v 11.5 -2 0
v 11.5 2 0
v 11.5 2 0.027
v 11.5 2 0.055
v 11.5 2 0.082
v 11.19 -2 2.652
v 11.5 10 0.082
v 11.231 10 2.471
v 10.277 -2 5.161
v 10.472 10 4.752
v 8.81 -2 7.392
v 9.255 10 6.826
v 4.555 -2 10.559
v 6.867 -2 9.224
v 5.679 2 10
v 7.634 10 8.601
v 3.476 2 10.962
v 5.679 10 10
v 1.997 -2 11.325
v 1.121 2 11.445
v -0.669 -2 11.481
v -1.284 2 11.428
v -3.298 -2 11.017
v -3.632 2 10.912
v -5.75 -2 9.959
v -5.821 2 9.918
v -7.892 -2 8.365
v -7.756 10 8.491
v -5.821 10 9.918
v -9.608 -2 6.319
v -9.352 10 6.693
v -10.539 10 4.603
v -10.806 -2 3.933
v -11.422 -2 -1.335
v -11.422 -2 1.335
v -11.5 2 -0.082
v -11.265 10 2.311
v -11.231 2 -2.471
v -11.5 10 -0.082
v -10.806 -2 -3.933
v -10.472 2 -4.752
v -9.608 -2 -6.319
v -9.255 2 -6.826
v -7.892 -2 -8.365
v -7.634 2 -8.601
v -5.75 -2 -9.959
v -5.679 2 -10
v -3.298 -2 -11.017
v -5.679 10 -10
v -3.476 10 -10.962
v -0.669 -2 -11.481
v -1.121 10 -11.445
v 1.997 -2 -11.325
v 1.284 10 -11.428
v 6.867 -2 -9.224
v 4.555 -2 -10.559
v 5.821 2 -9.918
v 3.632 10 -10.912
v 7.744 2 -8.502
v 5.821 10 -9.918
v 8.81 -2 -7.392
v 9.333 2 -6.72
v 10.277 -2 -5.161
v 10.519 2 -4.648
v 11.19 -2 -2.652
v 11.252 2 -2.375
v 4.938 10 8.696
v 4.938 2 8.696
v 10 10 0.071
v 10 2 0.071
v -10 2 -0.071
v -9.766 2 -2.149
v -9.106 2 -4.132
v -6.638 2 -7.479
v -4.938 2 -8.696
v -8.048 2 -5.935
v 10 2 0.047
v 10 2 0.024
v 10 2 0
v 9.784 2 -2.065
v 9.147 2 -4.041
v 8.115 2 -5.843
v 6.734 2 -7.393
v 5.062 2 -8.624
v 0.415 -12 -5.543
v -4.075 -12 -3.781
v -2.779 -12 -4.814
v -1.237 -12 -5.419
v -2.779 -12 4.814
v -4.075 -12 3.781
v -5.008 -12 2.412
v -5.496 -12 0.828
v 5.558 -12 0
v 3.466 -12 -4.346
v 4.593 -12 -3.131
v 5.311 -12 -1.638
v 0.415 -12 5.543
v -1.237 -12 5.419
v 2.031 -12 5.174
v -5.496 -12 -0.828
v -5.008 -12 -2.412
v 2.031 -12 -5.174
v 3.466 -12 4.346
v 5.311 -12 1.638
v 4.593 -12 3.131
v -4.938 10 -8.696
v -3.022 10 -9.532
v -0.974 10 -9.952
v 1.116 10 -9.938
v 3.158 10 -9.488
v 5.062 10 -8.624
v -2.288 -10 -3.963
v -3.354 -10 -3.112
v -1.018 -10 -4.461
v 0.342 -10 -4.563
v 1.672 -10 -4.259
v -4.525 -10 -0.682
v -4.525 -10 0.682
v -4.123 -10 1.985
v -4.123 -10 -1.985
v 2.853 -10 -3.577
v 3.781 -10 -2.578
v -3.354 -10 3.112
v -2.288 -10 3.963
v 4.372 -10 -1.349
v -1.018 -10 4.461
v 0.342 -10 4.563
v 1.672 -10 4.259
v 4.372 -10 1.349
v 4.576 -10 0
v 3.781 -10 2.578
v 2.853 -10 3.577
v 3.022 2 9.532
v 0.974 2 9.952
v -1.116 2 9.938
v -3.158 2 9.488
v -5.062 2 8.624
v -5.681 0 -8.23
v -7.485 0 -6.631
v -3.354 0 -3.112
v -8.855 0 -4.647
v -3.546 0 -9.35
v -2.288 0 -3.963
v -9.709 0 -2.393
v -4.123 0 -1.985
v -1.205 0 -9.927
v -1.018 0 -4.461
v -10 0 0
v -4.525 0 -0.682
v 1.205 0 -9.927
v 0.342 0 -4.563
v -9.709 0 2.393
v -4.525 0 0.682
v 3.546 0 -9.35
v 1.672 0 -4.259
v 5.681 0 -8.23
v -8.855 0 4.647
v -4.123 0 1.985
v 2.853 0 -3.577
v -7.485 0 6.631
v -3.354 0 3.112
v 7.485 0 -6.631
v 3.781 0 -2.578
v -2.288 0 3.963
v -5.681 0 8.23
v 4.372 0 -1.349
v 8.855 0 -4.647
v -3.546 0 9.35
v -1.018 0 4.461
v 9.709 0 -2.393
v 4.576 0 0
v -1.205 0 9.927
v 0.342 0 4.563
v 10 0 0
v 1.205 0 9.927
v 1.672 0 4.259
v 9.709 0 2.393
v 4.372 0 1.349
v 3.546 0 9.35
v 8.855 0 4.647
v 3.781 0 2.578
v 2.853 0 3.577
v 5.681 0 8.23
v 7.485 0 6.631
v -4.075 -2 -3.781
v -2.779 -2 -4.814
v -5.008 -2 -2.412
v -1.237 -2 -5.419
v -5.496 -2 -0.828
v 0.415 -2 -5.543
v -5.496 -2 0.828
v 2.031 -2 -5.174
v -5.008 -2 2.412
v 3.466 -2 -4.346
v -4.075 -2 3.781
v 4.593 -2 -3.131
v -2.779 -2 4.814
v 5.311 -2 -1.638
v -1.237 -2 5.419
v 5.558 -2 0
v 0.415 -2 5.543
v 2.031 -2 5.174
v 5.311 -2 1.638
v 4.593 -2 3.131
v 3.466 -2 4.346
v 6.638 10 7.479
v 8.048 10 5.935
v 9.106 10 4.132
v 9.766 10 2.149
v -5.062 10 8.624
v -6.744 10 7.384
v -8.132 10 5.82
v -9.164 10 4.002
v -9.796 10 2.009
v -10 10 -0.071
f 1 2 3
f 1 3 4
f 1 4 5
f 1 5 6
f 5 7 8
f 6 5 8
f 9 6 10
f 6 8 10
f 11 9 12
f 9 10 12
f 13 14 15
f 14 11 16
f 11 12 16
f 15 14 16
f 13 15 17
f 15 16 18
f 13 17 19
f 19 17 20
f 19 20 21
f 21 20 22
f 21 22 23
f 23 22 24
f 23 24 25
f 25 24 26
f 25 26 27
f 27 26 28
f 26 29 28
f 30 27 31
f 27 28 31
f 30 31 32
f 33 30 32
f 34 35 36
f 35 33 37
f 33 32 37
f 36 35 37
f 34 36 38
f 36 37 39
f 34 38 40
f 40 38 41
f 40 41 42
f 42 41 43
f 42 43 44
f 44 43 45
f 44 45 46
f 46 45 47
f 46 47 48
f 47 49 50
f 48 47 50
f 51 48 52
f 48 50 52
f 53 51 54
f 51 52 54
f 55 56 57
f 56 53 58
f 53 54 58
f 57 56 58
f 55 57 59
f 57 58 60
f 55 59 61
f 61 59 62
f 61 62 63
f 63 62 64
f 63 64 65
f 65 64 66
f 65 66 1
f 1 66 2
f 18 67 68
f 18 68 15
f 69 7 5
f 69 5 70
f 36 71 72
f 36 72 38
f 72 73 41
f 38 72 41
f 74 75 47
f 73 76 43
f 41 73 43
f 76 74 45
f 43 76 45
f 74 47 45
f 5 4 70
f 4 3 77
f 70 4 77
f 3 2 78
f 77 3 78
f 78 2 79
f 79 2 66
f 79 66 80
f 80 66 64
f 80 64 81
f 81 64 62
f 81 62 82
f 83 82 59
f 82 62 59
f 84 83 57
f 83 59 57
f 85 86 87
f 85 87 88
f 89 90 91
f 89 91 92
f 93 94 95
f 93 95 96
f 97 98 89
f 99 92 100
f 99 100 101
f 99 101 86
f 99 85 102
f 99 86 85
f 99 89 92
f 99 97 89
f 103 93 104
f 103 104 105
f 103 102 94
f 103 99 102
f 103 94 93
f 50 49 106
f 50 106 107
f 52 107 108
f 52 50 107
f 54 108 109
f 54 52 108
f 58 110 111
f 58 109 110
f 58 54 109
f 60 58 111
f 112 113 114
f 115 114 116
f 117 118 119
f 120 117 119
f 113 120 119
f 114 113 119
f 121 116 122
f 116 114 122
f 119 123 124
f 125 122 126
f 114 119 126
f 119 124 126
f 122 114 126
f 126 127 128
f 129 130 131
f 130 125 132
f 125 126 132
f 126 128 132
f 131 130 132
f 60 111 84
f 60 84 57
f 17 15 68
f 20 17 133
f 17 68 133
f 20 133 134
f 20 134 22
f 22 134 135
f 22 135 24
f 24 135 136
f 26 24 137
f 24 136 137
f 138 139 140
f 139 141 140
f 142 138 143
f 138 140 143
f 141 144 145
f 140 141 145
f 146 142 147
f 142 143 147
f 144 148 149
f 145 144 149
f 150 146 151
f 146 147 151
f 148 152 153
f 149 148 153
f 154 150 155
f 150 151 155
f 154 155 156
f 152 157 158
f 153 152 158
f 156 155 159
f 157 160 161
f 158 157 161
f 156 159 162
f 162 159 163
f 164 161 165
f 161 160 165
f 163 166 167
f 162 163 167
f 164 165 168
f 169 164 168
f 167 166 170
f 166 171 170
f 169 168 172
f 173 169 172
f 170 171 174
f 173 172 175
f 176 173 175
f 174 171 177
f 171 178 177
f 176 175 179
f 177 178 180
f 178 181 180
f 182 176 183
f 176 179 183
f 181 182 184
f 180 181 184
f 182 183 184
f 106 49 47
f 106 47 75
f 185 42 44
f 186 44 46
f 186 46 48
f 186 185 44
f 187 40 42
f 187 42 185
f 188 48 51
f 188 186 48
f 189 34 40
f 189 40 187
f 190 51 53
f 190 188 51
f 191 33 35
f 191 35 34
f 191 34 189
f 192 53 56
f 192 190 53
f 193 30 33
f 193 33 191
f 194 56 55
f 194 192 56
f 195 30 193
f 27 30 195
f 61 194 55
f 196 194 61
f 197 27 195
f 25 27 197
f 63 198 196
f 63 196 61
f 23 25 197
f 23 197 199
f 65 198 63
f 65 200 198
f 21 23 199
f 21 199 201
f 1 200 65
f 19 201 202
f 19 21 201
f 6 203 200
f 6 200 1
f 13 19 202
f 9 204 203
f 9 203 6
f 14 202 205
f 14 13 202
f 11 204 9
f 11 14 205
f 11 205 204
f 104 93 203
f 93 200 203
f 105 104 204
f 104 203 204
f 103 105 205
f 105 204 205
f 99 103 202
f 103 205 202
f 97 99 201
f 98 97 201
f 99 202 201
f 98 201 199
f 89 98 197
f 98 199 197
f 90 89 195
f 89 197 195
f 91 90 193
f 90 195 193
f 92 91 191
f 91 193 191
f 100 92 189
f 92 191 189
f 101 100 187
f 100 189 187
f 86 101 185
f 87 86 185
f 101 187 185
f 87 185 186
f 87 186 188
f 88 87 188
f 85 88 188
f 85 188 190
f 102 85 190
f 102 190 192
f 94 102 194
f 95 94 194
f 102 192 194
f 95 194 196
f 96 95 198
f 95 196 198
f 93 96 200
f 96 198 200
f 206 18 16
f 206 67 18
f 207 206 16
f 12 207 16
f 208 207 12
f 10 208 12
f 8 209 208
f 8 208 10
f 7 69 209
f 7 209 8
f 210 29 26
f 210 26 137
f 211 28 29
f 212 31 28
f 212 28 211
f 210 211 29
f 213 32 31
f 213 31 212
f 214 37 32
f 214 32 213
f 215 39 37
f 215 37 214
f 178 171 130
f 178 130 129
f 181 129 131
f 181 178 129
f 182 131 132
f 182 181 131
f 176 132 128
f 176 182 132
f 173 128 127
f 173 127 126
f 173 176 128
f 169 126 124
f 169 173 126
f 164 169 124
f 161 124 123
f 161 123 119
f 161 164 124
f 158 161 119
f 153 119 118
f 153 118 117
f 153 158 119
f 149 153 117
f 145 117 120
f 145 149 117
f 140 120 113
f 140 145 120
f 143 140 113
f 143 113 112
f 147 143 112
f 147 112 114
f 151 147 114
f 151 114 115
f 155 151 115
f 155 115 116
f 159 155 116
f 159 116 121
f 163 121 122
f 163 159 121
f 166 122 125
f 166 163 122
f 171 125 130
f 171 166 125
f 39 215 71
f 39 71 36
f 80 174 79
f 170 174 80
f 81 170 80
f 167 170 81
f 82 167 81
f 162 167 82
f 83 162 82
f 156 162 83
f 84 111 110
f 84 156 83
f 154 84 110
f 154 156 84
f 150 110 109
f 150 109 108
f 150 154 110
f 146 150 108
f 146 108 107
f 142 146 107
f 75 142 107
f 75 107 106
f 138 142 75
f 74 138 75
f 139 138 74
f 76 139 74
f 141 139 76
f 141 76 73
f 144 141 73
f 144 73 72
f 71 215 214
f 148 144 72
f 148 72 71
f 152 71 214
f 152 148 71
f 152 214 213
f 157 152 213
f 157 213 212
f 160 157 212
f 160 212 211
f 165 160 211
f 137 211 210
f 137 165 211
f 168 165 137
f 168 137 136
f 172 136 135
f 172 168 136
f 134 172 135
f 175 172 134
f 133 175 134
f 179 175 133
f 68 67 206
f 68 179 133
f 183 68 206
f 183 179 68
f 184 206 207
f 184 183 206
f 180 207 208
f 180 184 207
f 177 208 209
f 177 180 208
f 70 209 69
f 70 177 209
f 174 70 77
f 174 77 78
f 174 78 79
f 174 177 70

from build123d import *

# Parameters (mm, degrees)
SKETCH1_R           = 11.5
SKETCH1_R_2         = 10
BOSS_EXTRUDE1_DEPTH = 10
BOSS_EXTRUDE3_START = 2
SKETCH2_R           = 11.5
SKETCH2_R_2         = 5.558376586
BOSS_EXTRUDE3_DEPTH = 2
BOSS_EXTRUDE4_START = 10
SKETCH2_3_R         = 5.558376586
SKETCH2_3_R_2       = 4.575743436
BOSS_EXTRUDE4_DEPTH = 10
BOSS_EXTRUDE5_START = 2
SKETCH3_R           = 5.558376586
BOSS_EXTRUDE5_DEPTH = 2
CUT_EXTRUDE1_START  = -8
CUT_EXTRUDE1_DEPTH  = 8


with BuildPart() as part:
    # Sketch1 → Boss-Extrude1 (new body)
    with BuildSketch(Plane(origin=(0, 0, 0), x_dir=(1, 0, 0), z_dir=(0, 1, 0))):
        Circle(SKETCH1_R)
        Circle(SKETCH1_R_2, mode=Mode.SUBTRACT)
    extrude(amount=BOSS_EXTRUDE1_DEPTH)

    # Sketch2 → Boss-Extrude3 (add)
    with BuildSketch(Plane.XZ.offset(BOSS_EXTRUDE3_START)):
        Circle(SKETCH2_R)
        Circle(SKETCH2_R_2, mode=Mode.SUBTRACT)
    extrude(amount=-BOSS_EXTRUDE3_DEPTH)

    # Sketch2<3> → Boss-Extrude4 (add)
    with BuildSketch(Plane.XZ.offset(BOSS_EXTRUDE4_START)):
        Circle(SKETCH2_3_R)
        Circle(SKETCH2_3_R_2, mode=Mode.SUBTRACT)
    extrude(amount=-BOSS_EXTRUDE4_DEPTH)

    # Sketch3 → Boss-Extrude5 (add)
    with BuildSketch(Plane.XZ.offset(10).offset(BOSS_EXTRUDE5_START)):
        Circle(SKETCH3_R)
    extrude(amount=-BOSS_EXTRUDE5_DEPTH)

    # Sketch4 → Cut-Extrude1 (cut)
    with BuildSketch(Plane(origin=(0, 10, 0), x_dir=(1, 0, 0), z_dir=(0, 1, 0)).offset(CUT_EXTRUDE1_START)):
        with BuildLine():
            Line((-5.820799865, -9.918078893), (-5.0615651, -8.624416429))
            ThreePointArc((-5.0615651, -8.624416429), (-0.071235745, -9.99974627), (4.93818117, -8.695652174))
            Line((4.93818117, -8.695652174), (5.678908346, -10))
            ThreePointArc((5.678908346, -10), (-0.081921107, -11.499708211), (-5.820799865, -9.918078893))
        make_face()
        with BuildLine():
            Line((-5.678908346, 10), (-4.93818117, 8.695652174))
            ThreePointArc((-4.93818117, 8.695652174), (-8.624416429, 5.0615651), (-9.99974627, 0.071235745))
            Line((-9.99974627, 0.071235745), (-11.499708211, 0.081921107))
            ThreePointArc((-11.499708211, 0.081921107), (-9.918078893, 5.820799865), (-5.678908346, 10))
        make_face()
        with BuildLine():
            Line((11.499708211, -0.081921107), (9.99974627, -0.071235745))
            ThreePointArc((9.99974627, -0.071235745), (8.695652174, 4.93818117), (5.0615651, 8.624416429))
            Line((5.0615651, 8.624416429), (5.820799865, 9.918078893))
            ThreePointArc((5.820799865, 9.918078893), (10, 5.678908346), (11.499708211, -0.081921107))
        make_face()
    extrude(amount=CUT_EXTRUDE1_DEPTH, mode=Mode.SUBTRACT)


solid = part.part
